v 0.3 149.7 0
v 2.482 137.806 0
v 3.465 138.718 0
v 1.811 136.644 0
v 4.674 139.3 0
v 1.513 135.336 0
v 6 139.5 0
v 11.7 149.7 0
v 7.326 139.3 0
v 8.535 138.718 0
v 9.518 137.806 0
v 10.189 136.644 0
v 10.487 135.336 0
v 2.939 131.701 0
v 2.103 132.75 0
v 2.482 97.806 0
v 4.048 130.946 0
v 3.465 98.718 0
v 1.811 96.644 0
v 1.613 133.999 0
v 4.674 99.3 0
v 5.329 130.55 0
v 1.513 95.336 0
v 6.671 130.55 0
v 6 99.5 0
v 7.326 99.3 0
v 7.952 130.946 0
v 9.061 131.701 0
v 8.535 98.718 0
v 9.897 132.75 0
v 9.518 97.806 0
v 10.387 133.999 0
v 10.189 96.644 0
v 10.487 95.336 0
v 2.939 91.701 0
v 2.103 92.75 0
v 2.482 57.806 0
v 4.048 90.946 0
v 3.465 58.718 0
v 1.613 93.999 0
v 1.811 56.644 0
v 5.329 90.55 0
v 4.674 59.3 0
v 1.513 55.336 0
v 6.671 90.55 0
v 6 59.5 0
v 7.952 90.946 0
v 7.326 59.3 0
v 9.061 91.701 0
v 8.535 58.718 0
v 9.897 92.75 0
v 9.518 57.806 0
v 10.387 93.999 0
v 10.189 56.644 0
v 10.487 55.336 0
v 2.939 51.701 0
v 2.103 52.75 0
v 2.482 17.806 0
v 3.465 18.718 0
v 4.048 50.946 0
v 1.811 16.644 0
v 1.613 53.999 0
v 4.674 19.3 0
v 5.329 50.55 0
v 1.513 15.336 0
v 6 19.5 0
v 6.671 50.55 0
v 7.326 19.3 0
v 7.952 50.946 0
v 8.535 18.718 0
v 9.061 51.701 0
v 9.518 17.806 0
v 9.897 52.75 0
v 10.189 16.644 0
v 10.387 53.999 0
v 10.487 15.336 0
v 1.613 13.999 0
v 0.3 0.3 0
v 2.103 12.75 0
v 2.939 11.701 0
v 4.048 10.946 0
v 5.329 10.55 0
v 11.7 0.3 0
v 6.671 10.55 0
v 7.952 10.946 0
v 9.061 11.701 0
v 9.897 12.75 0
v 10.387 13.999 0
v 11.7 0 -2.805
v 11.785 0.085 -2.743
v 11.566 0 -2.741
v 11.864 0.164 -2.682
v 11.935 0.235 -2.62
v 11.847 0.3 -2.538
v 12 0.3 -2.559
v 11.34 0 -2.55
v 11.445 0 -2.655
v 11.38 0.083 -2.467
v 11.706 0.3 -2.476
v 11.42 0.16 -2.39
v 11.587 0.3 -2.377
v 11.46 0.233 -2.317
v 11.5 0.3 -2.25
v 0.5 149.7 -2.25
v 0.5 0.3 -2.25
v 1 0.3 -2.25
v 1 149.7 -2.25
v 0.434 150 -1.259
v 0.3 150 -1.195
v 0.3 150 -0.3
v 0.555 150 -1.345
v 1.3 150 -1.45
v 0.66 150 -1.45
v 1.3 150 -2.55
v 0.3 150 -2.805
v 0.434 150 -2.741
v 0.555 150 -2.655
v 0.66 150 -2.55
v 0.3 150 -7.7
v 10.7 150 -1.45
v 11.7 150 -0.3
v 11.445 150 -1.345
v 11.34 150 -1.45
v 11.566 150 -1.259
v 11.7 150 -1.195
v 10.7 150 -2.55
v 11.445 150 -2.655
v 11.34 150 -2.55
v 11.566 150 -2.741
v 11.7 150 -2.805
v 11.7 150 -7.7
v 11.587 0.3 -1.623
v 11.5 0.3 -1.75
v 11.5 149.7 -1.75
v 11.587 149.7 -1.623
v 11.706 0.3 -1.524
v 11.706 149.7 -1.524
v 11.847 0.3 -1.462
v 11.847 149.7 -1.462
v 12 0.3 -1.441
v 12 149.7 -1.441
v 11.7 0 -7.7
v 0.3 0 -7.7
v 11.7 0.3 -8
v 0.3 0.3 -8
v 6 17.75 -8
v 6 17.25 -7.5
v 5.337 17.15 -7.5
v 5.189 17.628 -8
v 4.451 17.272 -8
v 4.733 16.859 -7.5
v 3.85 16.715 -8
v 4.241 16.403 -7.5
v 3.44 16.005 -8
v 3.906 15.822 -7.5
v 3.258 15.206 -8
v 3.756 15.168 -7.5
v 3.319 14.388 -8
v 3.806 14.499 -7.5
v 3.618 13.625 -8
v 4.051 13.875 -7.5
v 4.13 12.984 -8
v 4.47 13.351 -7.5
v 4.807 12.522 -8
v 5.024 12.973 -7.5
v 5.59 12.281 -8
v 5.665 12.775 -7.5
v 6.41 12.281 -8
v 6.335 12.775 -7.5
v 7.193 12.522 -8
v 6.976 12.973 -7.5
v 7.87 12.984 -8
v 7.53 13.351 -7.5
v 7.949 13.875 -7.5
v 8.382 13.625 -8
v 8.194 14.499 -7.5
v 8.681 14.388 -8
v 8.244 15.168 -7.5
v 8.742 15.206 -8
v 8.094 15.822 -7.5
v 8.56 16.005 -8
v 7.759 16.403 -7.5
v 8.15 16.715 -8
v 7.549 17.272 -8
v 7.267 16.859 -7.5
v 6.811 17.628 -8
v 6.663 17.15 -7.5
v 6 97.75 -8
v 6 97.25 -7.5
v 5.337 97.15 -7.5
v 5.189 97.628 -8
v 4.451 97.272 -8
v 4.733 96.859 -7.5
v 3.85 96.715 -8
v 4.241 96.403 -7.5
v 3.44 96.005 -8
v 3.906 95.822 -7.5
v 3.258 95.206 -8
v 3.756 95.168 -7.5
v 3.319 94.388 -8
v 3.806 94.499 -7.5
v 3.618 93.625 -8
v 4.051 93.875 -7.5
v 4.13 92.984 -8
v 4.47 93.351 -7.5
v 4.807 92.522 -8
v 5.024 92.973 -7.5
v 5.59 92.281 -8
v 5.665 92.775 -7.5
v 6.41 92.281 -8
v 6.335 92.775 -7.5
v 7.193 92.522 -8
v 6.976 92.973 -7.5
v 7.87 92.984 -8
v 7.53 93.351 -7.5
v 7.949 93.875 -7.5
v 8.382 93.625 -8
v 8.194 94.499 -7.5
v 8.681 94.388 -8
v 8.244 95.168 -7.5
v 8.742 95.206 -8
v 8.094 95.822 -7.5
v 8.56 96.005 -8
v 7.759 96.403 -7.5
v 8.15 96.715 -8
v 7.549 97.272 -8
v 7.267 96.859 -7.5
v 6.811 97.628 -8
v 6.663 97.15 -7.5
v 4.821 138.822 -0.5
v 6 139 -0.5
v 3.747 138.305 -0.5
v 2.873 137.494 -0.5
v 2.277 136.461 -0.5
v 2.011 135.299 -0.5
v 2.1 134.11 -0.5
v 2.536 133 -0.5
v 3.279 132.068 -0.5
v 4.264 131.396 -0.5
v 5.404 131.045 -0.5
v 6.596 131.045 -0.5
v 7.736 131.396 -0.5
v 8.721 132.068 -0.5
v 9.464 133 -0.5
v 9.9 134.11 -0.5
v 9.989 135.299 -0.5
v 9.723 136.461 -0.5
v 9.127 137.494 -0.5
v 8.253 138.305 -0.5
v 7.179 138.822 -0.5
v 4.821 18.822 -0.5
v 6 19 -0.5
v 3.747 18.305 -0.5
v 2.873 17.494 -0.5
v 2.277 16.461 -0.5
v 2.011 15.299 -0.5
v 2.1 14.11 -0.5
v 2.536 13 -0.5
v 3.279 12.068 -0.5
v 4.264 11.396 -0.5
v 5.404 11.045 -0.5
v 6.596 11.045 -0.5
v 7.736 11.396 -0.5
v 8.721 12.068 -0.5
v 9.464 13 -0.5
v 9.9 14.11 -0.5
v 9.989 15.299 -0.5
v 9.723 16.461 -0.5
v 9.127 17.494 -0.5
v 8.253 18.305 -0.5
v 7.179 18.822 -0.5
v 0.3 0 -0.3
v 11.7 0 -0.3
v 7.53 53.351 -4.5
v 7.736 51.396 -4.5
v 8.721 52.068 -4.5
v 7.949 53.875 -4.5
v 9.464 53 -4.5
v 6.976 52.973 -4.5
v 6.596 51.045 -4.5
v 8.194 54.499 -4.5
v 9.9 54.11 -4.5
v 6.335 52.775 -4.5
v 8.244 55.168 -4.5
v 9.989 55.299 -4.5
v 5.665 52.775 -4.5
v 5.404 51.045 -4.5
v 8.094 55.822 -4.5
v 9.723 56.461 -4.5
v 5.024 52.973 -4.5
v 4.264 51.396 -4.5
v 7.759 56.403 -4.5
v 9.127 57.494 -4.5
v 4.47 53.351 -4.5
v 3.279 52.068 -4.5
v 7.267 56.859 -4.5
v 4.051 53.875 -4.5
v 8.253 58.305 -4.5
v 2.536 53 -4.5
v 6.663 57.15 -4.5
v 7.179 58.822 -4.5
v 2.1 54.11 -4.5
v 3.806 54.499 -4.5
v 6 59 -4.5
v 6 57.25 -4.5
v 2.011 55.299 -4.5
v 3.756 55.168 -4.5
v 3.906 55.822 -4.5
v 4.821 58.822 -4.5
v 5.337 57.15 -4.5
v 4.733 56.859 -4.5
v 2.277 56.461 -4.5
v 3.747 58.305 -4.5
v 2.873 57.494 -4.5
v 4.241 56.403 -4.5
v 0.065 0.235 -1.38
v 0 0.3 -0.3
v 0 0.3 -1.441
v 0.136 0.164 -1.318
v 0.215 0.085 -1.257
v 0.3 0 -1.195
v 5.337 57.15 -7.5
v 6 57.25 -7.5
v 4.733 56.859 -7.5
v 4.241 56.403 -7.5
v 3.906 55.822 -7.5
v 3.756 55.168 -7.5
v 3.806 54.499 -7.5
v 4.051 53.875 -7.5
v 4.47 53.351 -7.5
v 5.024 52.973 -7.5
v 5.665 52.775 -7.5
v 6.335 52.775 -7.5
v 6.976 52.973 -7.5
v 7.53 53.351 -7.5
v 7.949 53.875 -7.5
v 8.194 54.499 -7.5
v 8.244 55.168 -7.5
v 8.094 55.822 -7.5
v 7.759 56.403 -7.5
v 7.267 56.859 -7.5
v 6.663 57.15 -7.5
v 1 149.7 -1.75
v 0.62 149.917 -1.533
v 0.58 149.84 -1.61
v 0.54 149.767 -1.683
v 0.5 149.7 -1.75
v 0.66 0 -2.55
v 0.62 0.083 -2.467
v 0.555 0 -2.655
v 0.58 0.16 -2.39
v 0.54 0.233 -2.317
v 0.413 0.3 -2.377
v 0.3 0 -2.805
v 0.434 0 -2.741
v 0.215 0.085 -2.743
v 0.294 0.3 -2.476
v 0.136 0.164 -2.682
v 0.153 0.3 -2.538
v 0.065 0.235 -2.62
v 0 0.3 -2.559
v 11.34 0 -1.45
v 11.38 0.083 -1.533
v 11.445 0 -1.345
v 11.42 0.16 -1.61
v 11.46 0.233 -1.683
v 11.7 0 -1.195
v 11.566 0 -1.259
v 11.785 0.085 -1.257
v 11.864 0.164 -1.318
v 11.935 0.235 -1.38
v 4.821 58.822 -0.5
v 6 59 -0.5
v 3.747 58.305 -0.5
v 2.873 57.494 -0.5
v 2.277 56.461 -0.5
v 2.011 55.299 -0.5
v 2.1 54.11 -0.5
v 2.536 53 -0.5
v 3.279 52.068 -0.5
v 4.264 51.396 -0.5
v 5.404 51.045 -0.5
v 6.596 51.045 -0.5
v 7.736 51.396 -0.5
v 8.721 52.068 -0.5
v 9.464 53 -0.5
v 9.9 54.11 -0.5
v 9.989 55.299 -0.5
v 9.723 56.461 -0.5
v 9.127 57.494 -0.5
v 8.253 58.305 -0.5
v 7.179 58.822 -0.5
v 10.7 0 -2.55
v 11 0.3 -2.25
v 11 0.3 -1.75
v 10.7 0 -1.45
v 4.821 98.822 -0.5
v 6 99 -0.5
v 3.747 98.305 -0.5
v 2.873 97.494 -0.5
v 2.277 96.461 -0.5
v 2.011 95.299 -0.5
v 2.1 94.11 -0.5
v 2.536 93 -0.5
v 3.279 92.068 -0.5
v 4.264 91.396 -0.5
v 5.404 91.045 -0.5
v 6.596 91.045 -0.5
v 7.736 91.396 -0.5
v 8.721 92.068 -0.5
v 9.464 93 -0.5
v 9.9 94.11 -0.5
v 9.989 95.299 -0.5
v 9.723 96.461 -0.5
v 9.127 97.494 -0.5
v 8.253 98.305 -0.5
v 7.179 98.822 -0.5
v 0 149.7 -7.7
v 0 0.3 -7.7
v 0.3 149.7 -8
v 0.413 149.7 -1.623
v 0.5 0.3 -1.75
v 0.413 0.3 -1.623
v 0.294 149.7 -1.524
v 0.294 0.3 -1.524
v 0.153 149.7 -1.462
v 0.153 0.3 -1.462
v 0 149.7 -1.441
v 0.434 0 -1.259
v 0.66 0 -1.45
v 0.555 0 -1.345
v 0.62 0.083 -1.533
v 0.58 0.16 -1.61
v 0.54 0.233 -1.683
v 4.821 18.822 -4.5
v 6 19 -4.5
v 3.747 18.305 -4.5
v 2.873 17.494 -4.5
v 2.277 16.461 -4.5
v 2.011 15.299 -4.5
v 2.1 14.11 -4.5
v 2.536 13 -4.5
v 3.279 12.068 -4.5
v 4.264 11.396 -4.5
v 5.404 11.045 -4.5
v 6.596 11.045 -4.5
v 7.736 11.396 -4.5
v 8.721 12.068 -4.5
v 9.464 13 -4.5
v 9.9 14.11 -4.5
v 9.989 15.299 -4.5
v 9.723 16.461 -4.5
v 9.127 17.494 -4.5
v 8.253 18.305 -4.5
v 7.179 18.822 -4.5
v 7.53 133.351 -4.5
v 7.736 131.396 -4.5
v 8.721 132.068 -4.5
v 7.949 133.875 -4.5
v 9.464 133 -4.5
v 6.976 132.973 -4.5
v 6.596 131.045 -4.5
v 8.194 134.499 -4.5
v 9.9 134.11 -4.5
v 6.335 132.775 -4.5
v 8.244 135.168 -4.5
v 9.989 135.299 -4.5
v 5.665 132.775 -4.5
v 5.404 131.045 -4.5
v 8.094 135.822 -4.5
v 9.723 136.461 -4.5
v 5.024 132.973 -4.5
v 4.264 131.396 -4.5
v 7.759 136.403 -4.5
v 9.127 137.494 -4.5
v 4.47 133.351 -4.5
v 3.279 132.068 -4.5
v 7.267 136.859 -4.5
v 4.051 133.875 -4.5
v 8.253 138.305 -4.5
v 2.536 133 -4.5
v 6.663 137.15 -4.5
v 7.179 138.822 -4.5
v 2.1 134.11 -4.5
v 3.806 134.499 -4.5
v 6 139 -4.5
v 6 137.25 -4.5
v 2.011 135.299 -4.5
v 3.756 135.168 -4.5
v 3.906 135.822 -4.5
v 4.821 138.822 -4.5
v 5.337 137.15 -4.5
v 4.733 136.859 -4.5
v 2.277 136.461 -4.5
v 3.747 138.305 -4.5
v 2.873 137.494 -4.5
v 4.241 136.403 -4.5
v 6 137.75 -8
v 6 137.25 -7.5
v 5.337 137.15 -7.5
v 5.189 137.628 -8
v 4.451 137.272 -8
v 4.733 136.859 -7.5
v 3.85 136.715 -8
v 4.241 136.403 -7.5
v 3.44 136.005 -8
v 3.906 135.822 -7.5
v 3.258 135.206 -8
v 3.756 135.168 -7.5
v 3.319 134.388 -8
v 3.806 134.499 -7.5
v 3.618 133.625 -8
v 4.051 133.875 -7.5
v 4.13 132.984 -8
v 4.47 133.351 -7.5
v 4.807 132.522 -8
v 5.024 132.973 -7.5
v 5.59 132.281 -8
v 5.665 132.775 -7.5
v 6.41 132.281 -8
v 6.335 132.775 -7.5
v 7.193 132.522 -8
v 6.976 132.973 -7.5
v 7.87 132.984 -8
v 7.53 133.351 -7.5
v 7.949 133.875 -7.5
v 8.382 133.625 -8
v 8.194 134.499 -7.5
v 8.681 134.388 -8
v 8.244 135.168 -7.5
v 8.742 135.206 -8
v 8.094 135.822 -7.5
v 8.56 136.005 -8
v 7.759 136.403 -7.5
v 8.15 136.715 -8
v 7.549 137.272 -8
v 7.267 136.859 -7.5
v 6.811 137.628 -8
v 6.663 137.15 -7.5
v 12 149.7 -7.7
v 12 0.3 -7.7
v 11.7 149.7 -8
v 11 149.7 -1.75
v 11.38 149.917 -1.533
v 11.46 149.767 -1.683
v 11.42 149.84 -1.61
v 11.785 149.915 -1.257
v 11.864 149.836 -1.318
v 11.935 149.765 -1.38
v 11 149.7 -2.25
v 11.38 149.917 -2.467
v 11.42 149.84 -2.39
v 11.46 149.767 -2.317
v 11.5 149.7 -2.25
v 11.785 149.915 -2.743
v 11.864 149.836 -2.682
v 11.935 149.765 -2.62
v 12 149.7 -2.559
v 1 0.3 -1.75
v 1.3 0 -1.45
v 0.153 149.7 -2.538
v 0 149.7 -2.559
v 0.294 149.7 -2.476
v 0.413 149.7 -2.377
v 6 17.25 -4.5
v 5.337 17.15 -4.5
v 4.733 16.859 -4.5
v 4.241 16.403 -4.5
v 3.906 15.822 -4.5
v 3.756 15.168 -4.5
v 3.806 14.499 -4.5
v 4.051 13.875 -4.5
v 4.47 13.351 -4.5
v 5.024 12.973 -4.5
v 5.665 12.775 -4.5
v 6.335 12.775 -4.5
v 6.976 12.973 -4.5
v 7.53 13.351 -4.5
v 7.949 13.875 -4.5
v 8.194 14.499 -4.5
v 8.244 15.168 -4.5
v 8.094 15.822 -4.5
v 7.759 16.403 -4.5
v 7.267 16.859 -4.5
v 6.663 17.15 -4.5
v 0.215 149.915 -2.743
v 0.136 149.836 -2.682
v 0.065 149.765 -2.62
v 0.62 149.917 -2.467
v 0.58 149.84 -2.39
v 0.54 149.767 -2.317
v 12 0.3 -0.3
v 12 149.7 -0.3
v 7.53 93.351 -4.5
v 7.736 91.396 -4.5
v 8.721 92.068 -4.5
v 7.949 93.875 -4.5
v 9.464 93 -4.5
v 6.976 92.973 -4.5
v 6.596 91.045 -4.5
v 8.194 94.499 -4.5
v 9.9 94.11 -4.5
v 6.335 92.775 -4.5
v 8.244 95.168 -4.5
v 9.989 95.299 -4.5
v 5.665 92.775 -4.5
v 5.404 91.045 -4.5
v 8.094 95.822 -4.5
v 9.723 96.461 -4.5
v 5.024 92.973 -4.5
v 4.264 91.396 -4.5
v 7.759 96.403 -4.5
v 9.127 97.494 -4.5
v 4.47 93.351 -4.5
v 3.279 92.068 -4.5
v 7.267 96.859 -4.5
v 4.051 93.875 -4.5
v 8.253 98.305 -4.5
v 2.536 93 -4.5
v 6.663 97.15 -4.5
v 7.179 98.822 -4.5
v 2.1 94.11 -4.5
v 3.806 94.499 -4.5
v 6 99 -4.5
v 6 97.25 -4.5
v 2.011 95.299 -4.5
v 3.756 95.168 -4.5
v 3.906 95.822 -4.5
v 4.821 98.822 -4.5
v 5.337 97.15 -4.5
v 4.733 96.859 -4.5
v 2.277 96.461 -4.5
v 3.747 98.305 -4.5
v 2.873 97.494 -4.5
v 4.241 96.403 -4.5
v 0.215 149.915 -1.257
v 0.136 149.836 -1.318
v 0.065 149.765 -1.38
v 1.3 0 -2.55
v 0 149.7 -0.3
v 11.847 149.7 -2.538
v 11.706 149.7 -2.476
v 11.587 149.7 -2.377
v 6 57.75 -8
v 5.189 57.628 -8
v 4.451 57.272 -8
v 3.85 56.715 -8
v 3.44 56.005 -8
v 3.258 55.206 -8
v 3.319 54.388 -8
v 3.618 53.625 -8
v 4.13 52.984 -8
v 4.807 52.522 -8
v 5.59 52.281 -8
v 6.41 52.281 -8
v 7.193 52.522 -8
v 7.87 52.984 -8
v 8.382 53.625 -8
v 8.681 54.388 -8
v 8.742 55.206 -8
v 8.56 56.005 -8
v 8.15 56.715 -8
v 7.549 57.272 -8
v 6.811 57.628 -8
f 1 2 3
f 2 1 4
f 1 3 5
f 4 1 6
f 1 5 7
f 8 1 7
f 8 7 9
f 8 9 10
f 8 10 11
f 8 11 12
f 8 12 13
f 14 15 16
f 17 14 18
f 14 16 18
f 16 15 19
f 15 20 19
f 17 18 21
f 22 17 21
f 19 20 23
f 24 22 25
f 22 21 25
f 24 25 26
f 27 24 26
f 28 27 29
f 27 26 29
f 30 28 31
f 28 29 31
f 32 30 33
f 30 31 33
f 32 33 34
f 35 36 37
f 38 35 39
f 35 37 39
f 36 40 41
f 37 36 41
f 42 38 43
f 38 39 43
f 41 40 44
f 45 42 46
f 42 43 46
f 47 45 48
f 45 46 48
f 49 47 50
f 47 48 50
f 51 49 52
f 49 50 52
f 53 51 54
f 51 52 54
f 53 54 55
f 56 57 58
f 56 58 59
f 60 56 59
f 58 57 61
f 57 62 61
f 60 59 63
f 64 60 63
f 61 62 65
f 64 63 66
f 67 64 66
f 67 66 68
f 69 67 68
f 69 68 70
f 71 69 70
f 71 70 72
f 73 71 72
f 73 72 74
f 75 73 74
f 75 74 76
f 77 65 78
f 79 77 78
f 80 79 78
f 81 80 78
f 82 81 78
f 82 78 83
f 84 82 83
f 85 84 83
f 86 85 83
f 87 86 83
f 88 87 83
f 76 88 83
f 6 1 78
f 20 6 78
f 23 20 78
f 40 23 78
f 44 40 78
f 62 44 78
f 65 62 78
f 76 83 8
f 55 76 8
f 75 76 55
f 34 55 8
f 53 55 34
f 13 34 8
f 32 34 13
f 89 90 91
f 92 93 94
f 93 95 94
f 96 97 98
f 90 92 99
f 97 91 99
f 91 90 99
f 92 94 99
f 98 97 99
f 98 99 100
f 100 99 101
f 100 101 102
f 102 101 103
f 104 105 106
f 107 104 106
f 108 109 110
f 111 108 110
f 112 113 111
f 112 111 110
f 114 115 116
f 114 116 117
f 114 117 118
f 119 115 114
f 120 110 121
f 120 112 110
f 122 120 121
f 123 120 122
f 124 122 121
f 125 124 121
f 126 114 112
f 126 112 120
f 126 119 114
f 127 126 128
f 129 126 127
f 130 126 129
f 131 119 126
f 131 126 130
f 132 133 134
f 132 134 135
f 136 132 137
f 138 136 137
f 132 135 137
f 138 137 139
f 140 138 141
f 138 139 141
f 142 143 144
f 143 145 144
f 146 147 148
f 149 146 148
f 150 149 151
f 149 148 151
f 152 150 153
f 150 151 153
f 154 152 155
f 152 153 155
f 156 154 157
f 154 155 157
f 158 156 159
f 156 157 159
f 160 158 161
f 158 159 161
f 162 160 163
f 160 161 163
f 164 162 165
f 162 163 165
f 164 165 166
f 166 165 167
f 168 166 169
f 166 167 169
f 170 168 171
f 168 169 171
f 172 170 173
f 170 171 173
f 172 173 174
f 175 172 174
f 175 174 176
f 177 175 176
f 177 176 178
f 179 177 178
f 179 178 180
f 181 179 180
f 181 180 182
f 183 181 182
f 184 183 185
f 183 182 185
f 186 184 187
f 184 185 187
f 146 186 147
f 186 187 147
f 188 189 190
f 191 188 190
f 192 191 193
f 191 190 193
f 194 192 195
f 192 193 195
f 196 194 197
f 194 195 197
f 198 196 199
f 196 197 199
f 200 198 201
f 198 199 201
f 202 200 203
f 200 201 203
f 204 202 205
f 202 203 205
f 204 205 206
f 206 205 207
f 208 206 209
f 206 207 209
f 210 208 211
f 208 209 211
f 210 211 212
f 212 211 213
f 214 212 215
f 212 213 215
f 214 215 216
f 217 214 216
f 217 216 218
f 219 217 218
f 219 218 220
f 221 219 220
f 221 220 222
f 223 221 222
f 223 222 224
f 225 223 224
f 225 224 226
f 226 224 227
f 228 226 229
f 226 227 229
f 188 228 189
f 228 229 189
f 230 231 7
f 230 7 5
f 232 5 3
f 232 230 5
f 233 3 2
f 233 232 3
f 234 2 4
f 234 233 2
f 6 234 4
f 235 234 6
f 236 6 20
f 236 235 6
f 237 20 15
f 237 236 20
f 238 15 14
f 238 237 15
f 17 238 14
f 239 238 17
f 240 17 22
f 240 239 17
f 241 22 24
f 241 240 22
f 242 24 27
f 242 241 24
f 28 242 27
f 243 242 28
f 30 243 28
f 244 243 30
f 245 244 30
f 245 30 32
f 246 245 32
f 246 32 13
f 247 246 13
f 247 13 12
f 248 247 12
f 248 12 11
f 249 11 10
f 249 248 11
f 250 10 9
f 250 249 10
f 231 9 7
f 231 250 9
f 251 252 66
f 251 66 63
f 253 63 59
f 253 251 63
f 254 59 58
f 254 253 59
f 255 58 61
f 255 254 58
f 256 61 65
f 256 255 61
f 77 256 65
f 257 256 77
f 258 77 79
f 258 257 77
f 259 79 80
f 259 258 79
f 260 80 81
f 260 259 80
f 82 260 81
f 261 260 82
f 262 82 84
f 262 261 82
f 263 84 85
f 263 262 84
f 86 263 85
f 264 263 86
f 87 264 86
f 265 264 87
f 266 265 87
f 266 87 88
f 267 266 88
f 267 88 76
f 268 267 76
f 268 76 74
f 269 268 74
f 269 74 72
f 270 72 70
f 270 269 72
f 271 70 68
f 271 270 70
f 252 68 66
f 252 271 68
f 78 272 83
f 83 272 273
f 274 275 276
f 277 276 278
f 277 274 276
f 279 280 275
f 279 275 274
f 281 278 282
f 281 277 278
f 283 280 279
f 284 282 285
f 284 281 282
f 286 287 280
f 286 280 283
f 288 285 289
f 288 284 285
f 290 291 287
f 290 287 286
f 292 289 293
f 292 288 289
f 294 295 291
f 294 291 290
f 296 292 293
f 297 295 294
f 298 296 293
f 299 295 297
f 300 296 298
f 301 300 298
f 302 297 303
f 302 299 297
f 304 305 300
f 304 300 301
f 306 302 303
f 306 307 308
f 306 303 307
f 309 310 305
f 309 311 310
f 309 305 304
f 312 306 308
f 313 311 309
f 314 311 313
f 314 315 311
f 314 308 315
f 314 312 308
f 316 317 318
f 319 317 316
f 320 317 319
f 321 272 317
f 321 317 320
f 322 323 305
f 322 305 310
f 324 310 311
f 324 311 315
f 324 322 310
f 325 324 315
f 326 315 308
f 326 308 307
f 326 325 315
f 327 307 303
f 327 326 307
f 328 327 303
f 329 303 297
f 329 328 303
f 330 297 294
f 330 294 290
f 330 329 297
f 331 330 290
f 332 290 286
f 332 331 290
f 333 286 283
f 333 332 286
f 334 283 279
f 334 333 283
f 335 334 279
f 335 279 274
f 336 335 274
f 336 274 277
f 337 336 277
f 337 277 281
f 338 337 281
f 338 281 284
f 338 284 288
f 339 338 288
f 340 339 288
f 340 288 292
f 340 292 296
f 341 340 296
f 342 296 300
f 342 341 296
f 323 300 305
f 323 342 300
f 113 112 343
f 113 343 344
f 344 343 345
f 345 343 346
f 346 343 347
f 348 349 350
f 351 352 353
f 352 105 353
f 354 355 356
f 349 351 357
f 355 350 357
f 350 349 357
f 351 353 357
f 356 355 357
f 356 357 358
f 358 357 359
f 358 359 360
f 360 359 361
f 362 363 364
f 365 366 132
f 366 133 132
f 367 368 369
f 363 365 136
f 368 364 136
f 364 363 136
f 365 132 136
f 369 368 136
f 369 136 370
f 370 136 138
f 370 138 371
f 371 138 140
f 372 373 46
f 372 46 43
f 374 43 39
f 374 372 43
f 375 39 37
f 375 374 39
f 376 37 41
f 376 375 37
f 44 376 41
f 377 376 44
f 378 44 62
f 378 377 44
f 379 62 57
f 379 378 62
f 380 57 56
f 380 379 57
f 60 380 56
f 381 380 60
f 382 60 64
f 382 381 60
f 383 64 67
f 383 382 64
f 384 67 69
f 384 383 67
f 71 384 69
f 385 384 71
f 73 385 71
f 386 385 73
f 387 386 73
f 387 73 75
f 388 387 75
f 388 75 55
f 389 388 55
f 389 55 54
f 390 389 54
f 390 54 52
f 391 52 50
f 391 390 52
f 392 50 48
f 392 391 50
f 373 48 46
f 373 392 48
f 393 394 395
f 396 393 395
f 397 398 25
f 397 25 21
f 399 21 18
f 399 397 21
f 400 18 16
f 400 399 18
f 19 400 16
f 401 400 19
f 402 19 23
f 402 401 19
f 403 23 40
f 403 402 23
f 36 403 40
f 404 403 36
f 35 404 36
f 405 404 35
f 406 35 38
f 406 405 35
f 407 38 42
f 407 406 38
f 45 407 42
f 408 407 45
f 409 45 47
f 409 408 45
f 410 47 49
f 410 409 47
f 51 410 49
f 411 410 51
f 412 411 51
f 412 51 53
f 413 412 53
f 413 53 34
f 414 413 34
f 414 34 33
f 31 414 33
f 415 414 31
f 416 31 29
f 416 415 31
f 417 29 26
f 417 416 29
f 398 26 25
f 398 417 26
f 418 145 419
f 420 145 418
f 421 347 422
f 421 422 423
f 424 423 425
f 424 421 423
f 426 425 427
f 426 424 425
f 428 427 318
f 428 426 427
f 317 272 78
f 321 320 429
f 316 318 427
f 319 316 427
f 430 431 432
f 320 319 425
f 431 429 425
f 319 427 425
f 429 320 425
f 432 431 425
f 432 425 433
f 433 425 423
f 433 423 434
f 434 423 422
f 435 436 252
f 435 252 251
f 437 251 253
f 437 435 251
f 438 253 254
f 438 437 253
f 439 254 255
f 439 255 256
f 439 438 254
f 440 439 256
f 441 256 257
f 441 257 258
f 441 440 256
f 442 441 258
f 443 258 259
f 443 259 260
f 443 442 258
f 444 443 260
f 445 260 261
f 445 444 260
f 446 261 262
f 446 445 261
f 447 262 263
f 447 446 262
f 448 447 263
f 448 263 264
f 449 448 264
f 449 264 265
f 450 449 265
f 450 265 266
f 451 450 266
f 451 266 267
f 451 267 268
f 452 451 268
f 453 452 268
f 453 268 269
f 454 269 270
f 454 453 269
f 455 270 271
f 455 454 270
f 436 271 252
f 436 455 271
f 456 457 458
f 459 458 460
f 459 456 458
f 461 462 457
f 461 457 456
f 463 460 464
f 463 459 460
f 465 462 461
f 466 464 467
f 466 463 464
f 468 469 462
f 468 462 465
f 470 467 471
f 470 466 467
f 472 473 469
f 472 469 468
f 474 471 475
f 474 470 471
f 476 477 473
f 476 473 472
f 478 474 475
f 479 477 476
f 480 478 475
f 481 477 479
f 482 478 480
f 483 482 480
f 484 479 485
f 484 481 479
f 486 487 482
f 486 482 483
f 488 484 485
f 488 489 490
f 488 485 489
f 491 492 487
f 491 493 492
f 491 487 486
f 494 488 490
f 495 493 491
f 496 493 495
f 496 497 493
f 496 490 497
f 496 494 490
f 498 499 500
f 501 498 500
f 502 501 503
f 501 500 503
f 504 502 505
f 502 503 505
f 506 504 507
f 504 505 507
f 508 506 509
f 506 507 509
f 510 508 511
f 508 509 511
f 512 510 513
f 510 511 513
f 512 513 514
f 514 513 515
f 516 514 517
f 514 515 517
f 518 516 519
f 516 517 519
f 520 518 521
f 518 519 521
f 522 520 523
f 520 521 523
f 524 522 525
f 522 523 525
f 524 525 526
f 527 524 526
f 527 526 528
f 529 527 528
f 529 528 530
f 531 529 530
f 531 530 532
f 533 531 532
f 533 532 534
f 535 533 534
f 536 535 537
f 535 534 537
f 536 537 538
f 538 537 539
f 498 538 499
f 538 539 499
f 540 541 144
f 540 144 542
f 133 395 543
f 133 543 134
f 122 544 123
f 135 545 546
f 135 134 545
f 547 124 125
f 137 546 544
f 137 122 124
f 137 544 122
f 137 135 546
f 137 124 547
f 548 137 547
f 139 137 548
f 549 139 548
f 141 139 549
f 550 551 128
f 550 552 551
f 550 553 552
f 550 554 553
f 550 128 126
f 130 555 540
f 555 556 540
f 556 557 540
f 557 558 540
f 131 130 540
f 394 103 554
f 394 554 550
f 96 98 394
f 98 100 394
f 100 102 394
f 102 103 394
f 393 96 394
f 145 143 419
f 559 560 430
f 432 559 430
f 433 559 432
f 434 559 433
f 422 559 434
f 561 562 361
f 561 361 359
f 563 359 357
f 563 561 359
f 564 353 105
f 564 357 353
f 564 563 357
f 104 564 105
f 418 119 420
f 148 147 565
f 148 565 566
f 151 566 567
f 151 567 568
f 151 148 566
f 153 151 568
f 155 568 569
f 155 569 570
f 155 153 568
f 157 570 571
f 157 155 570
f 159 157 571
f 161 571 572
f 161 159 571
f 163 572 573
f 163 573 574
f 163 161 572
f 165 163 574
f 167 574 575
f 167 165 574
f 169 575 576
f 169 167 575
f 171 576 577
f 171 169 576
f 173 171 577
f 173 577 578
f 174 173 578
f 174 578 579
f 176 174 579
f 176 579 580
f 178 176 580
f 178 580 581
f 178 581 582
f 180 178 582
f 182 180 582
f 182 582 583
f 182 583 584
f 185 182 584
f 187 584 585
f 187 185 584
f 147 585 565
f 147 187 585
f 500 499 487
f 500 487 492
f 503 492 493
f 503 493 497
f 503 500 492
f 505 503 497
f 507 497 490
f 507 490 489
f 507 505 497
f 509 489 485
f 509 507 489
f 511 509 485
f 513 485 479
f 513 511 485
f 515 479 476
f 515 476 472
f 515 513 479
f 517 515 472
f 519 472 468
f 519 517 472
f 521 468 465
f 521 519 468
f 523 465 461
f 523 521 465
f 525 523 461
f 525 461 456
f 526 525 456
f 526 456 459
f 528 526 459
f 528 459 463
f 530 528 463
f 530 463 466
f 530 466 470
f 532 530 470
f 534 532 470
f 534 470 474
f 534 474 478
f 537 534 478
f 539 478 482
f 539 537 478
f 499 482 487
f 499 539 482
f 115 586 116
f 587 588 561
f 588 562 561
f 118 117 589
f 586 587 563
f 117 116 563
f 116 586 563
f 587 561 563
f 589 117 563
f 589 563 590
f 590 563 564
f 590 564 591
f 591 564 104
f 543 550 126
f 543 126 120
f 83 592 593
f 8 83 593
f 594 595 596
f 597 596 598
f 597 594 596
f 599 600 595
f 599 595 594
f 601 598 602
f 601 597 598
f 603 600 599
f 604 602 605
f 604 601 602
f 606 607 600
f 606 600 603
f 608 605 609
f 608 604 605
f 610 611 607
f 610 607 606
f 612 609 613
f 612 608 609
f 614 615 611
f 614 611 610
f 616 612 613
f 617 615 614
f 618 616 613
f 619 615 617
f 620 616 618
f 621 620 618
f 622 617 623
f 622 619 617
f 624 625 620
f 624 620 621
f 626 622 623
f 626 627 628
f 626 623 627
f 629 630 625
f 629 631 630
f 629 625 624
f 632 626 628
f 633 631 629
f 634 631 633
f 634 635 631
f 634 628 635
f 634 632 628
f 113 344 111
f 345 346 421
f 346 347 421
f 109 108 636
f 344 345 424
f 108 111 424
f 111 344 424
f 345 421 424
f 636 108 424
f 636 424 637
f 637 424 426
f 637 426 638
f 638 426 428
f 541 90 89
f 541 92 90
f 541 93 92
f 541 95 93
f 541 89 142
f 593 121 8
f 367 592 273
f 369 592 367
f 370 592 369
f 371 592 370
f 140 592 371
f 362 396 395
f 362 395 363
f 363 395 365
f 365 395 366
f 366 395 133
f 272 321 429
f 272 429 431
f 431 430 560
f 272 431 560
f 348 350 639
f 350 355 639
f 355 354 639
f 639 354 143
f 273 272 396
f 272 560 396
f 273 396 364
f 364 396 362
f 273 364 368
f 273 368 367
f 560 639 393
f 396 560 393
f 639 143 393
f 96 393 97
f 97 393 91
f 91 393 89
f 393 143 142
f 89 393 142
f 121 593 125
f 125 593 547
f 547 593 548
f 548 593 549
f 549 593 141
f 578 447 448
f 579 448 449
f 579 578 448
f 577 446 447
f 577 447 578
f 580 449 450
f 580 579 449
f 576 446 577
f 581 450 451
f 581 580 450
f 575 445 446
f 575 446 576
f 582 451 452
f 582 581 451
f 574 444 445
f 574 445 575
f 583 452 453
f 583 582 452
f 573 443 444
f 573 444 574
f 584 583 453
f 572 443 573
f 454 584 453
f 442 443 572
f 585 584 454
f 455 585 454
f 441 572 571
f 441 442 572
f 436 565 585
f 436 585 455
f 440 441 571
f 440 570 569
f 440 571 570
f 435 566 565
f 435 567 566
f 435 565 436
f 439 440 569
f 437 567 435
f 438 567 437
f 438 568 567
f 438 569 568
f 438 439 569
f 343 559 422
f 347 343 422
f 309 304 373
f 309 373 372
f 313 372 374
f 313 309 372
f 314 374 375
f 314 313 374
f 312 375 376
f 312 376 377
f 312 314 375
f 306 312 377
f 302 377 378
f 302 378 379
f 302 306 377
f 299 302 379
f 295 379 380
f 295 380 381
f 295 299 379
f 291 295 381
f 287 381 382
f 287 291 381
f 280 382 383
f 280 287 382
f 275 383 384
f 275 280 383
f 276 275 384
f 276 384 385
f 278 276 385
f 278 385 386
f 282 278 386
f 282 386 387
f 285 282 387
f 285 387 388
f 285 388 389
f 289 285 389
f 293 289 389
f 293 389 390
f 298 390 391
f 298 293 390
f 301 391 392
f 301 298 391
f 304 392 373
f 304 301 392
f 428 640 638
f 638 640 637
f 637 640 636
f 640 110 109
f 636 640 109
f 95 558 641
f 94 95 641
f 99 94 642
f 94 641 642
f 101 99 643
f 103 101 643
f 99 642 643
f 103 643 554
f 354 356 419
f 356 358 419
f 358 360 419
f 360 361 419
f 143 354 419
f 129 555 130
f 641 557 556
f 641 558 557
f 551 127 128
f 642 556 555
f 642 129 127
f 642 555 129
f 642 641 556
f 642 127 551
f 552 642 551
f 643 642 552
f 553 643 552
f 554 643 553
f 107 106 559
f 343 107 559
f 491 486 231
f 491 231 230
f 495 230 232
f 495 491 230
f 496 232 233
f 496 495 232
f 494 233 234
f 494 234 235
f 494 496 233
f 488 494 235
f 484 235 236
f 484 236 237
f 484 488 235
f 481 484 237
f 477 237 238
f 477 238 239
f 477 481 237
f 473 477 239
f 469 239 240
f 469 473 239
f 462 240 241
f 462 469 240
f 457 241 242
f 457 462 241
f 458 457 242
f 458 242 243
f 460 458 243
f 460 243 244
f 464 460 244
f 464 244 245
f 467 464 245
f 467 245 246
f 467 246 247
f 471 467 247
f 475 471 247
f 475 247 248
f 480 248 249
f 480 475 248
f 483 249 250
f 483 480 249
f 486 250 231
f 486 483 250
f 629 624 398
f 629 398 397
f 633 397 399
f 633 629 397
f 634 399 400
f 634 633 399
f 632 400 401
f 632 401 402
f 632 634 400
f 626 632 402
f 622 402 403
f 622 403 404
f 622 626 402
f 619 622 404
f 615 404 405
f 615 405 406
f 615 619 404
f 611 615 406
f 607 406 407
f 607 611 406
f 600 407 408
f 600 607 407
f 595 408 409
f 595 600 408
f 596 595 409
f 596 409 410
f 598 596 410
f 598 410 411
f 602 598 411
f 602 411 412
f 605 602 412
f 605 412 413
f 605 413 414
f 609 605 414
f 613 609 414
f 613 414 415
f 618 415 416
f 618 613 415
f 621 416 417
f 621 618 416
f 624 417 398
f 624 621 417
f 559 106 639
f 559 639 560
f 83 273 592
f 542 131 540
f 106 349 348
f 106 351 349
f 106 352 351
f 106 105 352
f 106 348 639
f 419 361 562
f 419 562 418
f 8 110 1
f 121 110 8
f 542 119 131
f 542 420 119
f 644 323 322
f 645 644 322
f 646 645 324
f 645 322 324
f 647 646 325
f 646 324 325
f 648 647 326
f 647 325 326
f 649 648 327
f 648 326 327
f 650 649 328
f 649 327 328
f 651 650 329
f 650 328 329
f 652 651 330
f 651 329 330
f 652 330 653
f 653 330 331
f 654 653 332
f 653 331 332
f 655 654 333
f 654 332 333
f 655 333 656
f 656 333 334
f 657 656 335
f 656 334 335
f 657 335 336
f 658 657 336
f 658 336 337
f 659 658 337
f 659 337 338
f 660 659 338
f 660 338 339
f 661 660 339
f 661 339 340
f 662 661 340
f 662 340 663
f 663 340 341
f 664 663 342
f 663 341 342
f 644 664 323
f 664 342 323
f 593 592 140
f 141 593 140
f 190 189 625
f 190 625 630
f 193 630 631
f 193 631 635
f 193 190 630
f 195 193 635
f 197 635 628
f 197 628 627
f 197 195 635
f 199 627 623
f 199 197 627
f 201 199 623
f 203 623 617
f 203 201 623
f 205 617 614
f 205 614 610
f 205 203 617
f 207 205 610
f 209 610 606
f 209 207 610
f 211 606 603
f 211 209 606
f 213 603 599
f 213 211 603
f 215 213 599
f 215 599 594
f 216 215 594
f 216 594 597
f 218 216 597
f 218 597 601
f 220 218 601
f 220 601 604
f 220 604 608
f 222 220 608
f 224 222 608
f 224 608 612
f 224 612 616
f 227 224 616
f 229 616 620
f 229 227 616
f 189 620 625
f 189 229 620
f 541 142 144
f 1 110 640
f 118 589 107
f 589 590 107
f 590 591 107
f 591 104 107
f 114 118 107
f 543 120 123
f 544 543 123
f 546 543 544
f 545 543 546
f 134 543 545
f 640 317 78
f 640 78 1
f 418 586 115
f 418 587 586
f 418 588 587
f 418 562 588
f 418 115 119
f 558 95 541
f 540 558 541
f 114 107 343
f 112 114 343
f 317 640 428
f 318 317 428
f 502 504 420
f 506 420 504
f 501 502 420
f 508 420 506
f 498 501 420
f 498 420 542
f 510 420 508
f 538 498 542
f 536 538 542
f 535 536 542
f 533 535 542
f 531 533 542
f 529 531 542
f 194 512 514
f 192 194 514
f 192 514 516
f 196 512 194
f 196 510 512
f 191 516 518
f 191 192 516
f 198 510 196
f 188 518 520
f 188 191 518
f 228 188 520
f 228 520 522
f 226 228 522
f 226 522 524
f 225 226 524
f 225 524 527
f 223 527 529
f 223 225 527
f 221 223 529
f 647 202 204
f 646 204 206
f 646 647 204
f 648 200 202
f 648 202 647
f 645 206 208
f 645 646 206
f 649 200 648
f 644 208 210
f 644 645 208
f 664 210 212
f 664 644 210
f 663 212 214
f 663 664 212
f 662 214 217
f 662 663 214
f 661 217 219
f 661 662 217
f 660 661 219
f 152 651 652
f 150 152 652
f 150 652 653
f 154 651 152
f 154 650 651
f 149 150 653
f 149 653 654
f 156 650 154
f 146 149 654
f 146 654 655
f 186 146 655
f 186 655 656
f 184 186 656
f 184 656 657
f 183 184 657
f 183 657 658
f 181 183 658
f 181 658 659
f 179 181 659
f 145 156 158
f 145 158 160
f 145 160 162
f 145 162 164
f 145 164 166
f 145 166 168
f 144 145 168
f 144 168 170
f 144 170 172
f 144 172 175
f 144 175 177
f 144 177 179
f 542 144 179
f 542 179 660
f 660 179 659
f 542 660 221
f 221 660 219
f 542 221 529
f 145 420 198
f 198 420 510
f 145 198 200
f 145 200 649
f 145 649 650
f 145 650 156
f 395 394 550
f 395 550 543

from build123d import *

# Parameters (mm, degrees)
SKETCH_1_W                         = 12
SKETCH_1_H                         = 8
EXTRUDE_1_DEPTH                    = 150
CUT_EXTRUDE_1_DEPTH                = 151
CHAMFER_1_SIZE                     = 0.5
PATTERN_LINEAR_1_COUNT             = 4
PATTERN_LINEAR_1_PITCH             = 40
CHAMFER_1_OF_PATTERN_LINEAR_1_SIZE = 0.5
CHAMFER_2_SIZE                     = 0.3


with BuildPart() as part:
    # Эскиз1 → Бобышка-Вытянуть1 (new body)
    with BuildSketch(Plane(origin=(0, 0, 0), x_dir=(1, 0, 0), z_dir=(0, 1, 0))):
        with Locations((6, 4)):
            Rectangle(SKETCH_1_W, SKETCH_1_H)
    extrude(amount=EXTRUDE_1_DEPTH)

    # Эскиз2 → Вырез-Вытянуть1 (cut, through all)
    with BuildSketch(Plane(origin=(0, 150, 0), x_dir=(1, 0, 0), z_dir=(0, 1, 0))):
        with BuildLine():
            Line((11, 2.25), (11, 1.75))
            Line((11, 1.75), (11.5, 1.75))
            ThreePointArc((11.5, 1.75), (11.706107374, 1.524471742), (12, 1.440983006))
            Line((12, 1.440983006), (12, 2.559016994))
            ThreePointArc((12, 2.559016994), (11.706107374, 2.475528258), (11.5, 2.25))
            Line((11.5, 2.25), (11, 2.25))
        make_face()
    cut_extrude_1 = extrude(amount=-CUT_EXTRUDE_1_DEPTH, mode=Mode.SUBTRACT)

    # Зеркальное отражение1: Вырез-Вытянуть1 across plane
    add(cut_extrude_1.mirror(Plane(origin=(6, 0, 0), x_dir=(0, 0, 1), z_dir=(1, 0, 0))), mode=Mode.SUBTRACT)

    # Эскиз4 → Вырез-Повернуть1 (revolve, cut)
    with BuildSketch(Plane(origin=(6, 0, 0), x_dir=(0, 0, -1), z_dir=(1, 0, 0))):
        Polygon((0, 139), (4.5, 139), (4.5, 137.25), (8, 137.25), (8, 135), (0, 135), align=None)
    cut_revolve_1 = revolve(axis=Axis((6, 135, -8), (0, 0, 1)), mode=Mode.SUBTRACT)

    # Фаска1
    chamfer_1_edges = [part.edges().sort_by_distance(p)[0] for p in [
        (6, 131, 0),
        (6, 132.75, -8),
    ]]
    chamfer(chamfer_1_edges, length=CHAMFER_1_SIZE)

    # Линейный массив1: Вырез-Повернуть1 ×4
    with Locations(*[(0, -i * PATTERN_LINEAR_1_PITCH, 0) for i in range(1, PATTERN_LINEAR_1_COUNT)]):
        add(cut_revolve_1, mode=Mode.SUBTRACT)

    # Фаска1 of Линейный массив1
    chamfer_1_of_pattern_linear_1_edges = [part.edges().sort_by_distance(p)[0] for p in [
        (6, 91, 0),
        (6, 92.75, -8),
        (6, 51, 0),
        (6, 52.75, -8),
        (6, 11, 0),
        (6, 12.75, -8),
    ]]
    chamfer(chamfer_1_of_pattern_linear_1_edges, length=CHAMFER_1_OF_PATTERN_LINEAR_1_SIZE)

    # Фаска2
    chamfer_2_edges = [part.edges().sort_by_distance(p)[0] for p in [
        (12, 150, -0.720491503),
        (6, 150, -8),
        (12, 0, -5.279508497),
        (12, 150, -5.279508497),
        (11.25, 0, -2.25),
        (11.706107374, 0, -2.475528258),
        (11.706107374, 0, -1.524471742),
        (11.25, 0, -1.75),
        (11, 0, -2),
        (11.25, 150, -2.25),
        (11, 150, -2),
        (11.25, 150, -1.75),
        (11.706107374, 150, -1.524471742),
        (11.706107374, 150, -2.475528258),
        (0, 0, -0.720491503),
        (0, 150, -0.720491503),
        (0, 150, -5.279508497),
        (0.75, 150, -2.25),
        (1, 150, -2),
        (0.75, 150, -1.75),
        (0.293892626, 150, -1.524471742),
        (0.293892626, 150, -2.475528258),
        (0.75, 0, -2.25),
        (6, 0, -8),
        (1, 0, -2),
        (0.75, 0, -1.75),
        (0.293892626, 0, -1.524471742),
        (0.293892626, 0, -2.475528258),
        (12, 0, -0.720491503),
        (6, 0, 0),
        (0, 0, -5.279508497),
        (6, 150, 0),
        (0, 75, -8),
        (12, 75, -8),
        (12, 75, 0),
        (0, 75, 0),
    ]]
    chamfer(chamfer_2_edges, length=CHAMFER_2_SIZE)


solid = part.part
